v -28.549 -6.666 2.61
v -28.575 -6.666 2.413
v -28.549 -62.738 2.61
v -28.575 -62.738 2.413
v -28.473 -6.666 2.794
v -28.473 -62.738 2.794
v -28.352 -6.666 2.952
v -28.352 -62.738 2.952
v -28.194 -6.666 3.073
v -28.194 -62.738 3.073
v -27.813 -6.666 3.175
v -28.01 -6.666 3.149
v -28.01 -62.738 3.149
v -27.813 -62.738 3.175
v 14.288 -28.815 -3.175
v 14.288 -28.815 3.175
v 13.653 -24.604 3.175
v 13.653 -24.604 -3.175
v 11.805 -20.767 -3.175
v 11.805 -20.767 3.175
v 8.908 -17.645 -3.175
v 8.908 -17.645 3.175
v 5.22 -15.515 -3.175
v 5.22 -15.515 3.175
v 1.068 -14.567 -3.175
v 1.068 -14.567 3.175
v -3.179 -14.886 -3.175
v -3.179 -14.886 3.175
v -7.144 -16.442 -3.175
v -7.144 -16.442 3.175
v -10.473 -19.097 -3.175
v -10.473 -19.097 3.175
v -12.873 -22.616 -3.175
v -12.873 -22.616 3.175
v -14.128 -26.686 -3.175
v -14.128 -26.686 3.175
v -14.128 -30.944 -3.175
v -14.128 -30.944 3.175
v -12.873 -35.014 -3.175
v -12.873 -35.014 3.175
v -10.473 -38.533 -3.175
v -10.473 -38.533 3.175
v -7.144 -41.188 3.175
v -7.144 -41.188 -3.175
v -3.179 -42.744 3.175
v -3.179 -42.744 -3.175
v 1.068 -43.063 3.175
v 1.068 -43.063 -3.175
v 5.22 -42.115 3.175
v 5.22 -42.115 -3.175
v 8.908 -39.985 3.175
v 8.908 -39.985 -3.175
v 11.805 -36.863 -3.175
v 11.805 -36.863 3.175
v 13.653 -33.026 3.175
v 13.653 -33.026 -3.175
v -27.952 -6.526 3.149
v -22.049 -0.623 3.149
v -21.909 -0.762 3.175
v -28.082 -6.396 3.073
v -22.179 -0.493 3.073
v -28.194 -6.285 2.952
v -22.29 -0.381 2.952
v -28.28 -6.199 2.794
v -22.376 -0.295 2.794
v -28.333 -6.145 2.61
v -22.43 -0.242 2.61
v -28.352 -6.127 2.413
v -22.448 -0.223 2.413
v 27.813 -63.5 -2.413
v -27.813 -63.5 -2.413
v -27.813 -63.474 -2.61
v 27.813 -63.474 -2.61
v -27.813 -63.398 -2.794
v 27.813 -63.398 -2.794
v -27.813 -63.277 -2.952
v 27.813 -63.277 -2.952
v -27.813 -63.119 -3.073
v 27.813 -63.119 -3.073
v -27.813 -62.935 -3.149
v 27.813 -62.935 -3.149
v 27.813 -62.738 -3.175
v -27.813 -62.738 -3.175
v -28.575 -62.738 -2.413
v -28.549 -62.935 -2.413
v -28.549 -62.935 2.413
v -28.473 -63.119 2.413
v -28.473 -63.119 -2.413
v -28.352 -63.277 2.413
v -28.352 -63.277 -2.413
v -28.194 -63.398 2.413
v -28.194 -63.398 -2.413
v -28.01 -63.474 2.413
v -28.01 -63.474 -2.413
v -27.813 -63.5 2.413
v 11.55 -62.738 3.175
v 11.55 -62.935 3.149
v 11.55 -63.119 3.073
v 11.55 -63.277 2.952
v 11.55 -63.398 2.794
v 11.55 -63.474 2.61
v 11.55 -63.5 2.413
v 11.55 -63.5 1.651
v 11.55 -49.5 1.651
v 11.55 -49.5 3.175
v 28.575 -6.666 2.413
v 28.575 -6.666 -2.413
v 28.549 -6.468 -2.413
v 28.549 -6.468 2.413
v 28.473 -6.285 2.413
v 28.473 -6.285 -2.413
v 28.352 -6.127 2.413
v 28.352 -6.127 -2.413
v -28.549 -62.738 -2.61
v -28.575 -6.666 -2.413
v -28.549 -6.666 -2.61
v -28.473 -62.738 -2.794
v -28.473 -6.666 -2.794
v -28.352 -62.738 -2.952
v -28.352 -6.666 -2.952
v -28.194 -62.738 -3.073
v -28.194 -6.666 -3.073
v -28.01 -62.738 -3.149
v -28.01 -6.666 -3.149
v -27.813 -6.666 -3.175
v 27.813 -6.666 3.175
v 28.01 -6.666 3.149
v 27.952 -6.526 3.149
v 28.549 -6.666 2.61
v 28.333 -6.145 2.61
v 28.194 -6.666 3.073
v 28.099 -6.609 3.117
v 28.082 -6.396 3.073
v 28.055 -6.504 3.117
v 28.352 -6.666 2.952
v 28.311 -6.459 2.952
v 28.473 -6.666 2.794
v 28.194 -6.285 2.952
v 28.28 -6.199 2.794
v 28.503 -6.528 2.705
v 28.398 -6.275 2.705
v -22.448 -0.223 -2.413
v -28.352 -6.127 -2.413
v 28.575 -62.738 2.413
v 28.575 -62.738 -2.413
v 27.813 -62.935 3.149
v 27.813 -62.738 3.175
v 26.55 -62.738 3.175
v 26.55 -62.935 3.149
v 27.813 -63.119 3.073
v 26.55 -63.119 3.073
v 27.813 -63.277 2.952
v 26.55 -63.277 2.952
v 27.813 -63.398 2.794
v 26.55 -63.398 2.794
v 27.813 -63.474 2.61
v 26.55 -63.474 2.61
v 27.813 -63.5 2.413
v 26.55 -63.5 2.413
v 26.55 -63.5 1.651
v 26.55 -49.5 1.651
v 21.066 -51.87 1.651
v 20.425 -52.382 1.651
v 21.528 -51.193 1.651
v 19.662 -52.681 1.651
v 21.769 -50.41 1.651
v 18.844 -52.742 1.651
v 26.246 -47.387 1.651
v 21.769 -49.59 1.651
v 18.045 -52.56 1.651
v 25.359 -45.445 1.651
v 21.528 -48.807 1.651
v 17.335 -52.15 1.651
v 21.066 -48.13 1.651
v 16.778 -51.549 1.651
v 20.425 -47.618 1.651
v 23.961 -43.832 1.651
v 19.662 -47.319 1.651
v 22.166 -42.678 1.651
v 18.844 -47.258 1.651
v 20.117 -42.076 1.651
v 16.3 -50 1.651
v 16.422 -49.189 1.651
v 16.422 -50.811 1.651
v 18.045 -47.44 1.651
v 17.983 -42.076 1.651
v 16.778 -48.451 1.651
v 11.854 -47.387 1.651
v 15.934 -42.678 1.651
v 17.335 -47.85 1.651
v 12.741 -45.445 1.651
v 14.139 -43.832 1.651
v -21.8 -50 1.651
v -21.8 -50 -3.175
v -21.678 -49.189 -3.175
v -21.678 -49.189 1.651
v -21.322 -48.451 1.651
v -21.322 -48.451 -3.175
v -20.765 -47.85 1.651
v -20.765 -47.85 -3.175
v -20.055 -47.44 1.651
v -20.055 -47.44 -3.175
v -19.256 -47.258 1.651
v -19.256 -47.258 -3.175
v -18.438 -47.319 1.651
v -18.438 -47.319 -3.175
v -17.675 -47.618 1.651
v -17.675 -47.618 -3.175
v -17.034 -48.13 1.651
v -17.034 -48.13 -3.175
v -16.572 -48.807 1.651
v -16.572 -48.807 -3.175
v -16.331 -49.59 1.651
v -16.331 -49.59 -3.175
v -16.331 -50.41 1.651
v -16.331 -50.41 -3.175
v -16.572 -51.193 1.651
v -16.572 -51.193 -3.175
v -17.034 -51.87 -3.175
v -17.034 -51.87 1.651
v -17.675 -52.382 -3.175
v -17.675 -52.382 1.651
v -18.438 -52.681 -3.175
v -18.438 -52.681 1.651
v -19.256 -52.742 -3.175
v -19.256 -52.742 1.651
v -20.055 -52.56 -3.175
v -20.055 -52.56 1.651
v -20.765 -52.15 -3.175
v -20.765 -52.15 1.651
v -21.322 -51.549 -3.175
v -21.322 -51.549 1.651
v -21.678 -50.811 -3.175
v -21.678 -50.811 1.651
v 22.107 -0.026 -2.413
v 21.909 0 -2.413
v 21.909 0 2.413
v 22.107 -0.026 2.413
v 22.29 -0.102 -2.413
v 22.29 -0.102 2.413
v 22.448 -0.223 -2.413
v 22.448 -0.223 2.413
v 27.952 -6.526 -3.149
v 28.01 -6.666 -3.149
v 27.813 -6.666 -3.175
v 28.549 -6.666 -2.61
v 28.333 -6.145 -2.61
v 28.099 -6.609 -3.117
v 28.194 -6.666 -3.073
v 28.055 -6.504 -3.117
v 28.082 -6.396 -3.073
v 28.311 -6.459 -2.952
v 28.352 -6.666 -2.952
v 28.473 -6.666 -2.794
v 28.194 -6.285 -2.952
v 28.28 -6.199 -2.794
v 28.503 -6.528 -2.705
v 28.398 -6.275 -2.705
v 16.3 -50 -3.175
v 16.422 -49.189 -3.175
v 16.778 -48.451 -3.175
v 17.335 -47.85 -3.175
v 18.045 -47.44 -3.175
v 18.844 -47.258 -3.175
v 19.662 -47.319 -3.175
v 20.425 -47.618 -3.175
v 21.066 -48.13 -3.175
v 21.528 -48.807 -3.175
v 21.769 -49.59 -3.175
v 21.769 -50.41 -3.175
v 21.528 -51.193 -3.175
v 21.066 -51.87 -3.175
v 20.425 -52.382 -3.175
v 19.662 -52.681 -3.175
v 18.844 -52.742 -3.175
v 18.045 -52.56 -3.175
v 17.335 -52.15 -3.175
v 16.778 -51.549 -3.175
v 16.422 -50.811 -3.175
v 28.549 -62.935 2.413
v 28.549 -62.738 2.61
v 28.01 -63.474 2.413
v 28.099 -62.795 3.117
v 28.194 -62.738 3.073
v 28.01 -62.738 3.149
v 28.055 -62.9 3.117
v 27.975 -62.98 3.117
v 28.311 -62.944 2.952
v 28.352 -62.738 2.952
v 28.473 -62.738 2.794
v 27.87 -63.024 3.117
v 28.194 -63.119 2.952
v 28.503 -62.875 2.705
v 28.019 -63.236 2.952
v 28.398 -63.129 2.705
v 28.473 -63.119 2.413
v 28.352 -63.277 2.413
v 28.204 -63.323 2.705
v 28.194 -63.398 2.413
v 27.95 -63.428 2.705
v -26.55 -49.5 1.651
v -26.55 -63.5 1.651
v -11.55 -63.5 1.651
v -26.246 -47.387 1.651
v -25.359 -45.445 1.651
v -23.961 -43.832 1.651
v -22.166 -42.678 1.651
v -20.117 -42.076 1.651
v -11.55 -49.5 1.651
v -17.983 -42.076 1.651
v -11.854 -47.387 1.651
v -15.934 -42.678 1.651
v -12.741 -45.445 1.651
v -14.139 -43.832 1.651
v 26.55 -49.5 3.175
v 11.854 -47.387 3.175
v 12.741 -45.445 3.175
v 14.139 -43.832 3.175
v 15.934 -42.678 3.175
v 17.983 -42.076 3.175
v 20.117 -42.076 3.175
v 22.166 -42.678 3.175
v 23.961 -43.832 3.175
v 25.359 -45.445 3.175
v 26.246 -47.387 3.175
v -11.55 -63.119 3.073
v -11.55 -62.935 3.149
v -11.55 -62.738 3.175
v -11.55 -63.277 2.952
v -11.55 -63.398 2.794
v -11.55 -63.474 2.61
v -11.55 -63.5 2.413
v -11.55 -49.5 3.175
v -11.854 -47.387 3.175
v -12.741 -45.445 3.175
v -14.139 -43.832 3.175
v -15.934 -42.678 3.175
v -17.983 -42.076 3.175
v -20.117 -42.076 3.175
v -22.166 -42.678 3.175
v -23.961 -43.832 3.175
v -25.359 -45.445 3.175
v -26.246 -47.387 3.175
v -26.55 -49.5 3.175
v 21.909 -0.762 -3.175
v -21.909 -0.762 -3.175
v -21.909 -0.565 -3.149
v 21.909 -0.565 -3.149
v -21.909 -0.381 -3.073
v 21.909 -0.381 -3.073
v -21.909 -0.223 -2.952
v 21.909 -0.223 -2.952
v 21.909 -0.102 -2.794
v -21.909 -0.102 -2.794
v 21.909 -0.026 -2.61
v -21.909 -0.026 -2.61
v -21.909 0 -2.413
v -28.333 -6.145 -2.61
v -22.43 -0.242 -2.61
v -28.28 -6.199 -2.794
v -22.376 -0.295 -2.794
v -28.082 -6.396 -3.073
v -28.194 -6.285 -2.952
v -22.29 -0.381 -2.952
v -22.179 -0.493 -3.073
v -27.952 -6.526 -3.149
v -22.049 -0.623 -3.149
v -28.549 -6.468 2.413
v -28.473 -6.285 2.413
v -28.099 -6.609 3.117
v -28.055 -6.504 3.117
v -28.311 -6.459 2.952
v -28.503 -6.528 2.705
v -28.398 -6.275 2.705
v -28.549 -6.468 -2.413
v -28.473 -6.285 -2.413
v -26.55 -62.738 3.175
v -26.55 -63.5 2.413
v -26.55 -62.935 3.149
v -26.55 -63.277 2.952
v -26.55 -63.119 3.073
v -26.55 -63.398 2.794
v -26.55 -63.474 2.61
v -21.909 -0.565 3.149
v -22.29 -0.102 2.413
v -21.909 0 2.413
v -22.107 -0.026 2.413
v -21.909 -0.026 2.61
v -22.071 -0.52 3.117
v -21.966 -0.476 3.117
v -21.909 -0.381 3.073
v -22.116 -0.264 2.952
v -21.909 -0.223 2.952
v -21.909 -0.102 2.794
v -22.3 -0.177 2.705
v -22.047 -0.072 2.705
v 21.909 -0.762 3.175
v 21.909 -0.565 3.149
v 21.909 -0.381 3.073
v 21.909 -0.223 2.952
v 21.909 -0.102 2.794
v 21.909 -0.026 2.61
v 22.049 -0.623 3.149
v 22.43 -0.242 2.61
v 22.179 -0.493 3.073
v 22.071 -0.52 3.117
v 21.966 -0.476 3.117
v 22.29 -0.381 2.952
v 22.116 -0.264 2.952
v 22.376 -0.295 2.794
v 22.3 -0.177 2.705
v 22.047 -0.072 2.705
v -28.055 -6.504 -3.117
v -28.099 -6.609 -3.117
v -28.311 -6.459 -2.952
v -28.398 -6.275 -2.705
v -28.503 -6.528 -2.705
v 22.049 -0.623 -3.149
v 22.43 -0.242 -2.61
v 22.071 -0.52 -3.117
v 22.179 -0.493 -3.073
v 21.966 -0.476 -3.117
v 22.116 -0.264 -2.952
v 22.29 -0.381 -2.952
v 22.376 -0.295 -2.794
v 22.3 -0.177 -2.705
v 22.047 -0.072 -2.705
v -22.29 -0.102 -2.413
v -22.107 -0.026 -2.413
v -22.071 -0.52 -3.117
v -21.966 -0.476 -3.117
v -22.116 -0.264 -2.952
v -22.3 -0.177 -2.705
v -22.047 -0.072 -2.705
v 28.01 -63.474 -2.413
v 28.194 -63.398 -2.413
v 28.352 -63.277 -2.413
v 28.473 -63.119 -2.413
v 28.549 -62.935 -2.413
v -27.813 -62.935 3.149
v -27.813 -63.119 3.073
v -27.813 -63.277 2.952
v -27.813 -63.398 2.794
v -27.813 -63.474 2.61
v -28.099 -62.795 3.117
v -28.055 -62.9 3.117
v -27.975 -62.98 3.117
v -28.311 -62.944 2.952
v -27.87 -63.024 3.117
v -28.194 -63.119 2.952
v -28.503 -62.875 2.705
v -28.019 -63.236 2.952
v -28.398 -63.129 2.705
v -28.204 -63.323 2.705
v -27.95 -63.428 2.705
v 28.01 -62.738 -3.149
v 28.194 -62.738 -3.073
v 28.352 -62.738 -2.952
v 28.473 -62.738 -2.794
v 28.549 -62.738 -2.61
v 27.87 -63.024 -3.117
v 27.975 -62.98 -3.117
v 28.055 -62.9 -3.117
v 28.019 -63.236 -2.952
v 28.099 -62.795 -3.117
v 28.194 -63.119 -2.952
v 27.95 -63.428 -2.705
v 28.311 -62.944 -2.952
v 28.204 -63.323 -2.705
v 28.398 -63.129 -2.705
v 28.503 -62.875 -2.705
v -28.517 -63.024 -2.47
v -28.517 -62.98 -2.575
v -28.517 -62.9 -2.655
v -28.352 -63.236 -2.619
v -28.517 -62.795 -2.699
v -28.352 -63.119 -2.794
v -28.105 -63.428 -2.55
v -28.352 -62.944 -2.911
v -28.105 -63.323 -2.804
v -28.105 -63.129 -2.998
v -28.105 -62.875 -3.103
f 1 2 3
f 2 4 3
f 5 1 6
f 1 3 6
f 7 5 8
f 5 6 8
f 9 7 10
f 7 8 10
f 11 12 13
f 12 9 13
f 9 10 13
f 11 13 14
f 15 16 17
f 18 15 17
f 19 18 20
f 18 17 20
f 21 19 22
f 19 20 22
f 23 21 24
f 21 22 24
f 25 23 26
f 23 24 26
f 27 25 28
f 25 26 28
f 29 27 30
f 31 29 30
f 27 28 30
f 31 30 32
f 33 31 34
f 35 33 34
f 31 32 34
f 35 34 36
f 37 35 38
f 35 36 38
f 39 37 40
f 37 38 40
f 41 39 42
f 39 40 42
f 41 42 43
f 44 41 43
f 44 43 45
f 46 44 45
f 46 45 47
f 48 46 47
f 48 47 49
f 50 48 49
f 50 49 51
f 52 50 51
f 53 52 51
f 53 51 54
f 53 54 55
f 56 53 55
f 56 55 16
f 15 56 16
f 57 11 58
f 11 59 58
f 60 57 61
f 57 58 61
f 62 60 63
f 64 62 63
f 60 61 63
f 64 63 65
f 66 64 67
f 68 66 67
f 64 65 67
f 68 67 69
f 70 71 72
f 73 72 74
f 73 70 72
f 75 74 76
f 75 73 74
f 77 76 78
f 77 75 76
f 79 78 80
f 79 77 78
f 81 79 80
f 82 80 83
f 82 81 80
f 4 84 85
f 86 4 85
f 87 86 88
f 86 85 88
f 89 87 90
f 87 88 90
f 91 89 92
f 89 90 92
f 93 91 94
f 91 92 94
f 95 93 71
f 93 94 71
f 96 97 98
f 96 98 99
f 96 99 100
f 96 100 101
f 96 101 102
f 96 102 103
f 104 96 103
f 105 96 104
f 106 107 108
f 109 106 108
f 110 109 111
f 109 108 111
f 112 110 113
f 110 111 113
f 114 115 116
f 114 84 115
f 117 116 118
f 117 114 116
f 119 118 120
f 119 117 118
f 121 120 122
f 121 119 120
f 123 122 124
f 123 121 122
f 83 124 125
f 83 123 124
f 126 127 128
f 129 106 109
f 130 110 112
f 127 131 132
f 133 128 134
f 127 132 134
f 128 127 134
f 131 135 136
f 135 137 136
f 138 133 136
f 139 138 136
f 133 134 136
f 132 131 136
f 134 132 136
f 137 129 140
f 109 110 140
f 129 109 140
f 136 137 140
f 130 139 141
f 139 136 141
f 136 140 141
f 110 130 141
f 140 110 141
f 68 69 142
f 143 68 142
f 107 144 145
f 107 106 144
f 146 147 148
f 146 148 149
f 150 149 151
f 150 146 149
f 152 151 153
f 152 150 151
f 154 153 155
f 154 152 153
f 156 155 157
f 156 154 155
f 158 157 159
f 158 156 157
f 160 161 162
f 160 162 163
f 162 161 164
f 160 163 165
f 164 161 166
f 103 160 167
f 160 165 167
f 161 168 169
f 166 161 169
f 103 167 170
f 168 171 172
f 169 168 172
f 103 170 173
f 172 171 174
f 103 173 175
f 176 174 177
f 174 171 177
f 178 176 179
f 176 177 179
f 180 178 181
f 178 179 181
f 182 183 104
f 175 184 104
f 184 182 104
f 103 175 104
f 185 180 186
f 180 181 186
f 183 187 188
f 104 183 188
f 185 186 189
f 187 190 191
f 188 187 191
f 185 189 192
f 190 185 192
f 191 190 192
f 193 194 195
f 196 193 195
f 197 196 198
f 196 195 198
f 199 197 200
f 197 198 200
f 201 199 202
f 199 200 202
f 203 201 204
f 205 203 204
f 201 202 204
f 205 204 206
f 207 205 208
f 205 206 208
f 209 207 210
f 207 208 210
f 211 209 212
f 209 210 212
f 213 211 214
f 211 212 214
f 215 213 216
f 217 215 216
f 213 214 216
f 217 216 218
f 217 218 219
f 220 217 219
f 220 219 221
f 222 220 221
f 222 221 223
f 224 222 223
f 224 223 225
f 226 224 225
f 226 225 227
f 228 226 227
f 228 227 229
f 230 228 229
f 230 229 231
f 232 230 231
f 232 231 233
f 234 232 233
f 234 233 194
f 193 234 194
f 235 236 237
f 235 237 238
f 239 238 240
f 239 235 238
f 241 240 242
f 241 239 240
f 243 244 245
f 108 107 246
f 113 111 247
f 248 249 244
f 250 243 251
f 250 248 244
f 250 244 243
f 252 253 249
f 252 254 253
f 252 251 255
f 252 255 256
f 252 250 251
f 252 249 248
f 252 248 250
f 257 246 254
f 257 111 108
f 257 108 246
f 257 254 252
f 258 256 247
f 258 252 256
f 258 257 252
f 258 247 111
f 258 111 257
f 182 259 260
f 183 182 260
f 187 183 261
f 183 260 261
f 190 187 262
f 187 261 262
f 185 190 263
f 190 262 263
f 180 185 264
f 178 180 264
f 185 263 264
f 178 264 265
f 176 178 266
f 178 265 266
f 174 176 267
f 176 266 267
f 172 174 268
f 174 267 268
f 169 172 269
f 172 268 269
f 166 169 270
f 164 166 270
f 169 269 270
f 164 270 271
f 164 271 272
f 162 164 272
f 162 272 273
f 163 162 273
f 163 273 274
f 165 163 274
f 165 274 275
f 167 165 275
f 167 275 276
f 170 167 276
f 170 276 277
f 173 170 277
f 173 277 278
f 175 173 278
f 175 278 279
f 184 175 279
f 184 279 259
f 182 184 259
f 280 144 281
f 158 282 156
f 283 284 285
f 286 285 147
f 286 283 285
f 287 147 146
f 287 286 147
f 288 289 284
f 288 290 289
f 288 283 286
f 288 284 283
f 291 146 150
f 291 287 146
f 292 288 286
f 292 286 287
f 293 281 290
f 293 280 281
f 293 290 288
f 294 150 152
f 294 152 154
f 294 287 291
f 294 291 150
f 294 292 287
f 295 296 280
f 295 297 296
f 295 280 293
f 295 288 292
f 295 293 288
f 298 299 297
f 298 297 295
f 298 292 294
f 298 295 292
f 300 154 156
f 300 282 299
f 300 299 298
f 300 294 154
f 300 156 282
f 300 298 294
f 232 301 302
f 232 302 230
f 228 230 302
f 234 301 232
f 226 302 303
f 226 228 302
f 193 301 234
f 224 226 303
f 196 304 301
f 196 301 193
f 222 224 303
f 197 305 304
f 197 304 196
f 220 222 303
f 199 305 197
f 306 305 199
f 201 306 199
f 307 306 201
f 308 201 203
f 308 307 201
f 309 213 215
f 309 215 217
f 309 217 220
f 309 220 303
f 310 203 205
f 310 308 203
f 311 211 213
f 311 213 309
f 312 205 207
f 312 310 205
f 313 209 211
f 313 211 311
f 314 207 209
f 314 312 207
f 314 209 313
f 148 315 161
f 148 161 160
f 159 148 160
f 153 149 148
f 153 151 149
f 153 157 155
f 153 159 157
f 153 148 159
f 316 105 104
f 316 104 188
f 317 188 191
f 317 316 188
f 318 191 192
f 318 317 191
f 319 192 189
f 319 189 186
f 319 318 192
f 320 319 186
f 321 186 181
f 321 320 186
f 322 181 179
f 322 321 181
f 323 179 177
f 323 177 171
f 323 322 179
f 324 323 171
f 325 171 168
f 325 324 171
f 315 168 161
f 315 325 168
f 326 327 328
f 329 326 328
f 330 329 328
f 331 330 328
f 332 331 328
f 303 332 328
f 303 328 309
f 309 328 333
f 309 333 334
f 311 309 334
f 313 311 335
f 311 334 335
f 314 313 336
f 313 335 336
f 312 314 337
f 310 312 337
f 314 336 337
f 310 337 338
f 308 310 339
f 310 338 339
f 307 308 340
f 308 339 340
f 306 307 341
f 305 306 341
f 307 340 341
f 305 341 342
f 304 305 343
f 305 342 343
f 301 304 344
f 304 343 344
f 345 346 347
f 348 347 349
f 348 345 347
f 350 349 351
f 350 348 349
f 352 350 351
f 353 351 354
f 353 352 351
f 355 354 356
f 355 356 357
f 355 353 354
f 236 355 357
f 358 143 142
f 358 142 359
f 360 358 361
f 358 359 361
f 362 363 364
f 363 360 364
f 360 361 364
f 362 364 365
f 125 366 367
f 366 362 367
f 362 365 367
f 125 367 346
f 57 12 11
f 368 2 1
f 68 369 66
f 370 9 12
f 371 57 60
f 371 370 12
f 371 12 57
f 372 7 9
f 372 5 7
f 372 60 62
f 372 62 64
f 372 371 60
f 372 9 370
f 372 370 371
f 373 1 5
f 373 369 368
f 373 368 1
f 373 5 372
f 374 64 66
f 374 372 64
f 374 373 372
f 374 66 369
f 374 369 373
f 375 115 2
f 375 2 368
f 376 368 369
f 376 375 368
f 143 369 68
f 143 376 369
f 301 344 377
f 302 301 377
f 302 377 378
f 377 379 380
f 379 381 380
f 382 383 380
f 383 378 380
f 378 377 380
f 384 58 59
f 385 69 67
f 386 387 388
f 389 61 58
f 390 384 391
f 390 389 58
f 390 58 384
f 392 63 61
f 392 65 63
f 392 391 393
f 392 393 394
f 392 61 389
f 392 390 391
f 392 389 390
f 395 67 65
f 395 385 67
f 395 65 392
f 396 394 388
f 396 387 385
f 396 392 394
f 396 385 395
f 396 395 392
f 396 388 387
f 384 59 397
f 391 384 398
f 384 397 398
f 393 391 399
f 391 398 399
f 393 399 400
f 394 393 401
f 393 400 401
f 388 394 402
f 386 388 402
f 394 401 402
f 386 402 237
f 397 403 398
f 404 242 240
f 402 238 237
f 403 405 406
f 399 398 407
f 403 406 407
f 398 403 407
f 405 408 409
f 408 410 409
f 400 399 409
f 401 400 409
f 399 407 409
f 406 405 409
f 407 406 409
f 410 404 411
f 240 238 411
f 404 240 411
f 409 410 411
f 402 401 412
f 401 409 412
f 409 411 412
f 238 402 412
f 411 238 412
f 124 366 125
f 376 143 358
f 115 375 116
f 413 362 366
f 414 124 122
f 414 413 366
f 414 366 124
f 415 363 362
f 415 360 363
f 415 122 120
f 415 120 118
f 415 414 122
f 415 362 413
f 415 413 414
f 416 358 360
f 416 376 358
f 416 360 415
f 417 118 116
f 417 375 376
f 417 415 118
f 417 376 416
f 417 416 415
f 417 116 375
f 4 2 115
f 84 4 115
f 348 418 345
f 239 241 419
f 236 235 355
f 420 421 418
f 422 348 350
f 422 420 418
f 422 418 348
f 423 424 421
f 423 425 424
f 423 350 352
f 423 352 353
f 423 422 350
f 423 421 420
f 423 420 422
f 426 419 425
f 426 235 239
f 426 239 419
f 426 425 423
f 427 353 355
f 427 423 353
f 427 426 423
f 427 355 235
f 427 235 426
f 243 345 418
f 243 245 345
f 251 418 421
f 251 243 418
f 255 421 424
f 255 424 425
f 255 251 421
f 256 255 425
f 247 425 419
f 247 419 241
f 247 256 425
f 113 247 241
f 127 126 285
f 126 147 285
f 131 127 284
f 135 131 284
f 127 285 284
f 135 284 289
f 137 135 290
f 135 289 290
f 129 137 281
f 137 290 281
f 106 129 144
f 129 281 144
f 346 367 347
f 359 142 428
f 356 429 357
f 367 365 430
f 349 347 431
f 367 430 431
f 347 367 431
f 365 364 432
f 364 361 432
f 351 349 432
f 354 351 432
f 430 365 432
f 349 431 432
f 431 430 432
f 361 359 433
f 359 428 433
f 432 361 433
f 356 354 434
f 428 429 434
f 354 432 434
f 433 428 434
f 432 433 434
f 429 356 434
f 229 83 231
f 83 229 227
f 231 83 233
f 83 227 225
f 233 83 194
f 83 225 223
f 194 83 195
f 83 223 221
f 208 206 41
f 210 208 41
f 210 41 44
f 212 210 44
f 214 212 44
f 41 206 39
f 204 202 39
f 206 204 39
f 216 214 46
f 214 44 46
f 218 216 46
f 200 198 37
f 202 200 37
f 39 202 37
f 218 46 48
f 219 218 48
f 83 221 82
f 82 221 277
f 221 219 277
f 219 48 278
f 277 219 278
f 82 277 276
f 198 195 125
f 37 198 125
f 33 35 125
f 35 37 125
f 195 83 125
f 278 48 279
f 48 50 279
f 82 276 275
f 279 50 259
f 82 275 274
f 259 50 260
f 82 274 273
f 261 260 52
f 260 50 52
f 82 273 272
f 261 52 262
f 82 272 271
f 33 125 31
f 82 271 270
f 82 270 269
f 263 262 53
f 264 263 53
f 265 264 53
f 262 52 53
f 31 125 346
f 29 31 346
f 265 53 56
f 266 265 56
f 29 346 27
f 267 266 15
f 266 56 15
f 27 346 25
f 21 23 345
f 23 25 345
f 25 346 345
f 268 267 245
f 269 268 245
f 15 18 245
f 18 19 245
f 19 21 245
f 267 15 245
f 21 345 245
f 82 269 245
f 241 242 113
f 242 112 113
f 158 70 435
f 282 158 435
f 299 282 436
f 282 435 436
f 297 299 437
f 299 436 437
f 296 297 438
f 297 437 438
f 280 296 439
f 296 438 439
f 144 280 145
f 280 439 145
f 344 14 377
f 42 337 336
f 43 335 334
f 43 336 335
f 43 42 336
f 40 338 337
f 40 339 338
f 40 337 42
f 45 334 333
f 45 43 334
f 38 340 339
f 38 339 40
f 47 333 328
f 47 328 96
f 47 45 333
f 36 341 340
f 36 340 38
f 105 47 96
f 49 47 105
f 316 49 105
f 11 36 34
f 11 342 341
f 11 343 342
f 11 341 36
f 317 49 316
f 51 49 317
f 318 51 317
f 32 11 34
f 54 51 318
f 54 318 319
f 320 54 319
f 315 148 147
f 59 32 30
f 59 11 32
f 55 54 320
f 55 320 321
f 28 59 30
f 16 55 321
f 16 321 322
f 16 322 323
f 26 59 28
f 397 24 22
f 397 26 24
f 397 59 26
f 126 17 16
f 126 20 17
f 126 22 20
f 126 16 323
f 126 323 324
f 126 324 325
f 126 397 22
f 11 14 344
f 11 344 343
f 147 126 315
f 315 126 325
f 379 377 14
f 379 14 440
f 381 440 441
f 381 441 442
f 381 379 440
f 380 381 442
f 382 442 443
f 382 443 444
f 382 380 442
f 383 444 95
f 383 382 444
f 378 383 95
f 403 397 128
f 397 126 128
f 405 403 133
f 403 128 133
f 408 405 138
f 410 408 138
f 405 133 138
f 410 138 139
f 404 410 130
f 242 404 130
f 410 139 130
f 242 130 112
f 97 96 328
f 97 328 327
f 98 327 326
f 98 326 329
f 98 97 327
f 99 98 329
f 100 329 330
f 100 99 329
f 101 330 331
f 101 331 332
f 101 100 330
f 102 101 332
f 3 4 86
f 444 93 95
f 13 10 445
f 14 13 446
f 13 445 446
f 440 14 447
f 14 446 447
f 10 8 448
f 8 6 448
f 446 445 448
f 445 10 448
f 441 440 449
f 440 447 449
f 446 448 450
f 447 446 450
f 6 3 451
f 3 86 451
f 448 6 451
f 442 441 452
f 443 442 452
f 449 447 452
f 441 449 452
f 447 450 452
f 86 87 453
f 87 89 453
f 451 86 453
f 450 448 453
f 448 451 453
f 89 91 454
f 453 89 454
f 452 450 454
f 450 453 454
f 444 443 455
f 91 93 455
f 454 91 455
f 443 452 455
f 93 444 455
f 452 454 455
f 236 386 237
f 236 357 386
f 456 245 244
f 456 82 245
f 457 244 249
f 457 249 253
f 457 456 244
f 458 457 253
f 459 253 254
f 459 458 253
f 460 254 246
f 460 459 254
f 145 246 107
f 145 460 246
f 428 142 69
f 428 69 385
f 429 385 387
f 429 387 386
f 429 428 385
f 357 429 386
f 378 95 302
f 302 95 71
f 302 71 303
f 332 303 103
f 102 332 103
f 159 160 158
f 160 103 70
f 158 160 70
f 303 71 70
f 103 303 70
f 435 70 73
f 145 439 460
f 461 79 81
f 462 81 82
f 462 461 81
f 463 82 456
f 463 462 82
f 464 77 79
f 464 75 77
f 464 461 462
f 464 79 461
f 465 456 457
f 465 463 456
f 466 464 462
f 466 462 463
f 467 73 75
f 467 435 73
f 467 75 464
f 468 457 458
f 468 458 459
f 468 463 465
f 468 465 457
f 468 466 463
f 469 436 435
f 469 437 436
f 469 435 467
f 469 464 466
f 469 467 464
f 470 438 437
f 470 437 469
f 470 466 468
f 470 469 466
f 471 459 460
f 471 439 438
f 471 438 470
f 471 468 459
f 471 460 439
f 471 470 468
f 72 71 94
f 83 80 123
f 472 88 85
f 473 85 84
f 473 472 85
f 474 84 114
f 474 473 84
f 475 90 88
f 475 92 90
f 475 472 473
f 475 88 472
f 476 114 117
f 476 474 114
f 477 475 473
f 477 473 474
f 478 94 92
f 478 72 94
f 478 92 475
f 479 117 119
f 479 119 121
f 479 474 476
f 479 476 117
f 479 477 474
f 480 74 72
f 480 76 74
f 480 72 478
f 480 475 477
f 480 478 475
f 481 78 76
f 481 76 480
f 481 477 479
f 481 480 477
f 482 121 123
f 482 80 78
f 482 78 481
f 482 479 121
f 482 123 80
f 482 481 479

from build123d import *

# Parameters (mm, degrees)
SKETCH2_W            = 57.15
SKETCH2_H            = 6.35
BOSS_EXTRUDE1_DEPTH  = 63.5
SKETCH3_R            = 14.2875
CUT_EXTRUDE1_DEPTH   = 70.922121857
CHAMFER1_SIZE        = 6.35
M5_CLEARANCE_HOLE1_D = 5.5
FILLET1_R            = 0.762
CUT_EXTRUDE4_DEPTH   = 1.524


with BuildPart() as part:
    # Sketch2 → Boss-Extrude1 (new body)
    with BuildSketch(Plane(origin=(0, 0, 0), x_dir=(1, 0, 0), z_dir=(0, 1, 0))):
        Rectangle(SKETCH2_W, SKETCH2_H)
    extrude(amount=-BOSS_EXTRUDE1_DEPTH)

    # Sketch3 → Cut-Extrude1 (cut, through all)
    with BuildSketch(Plane.XY.offset(3.175)):
        with Locations((0, -28.8150046)):
            Circle(SKETCH3_R)
    extrude(amount=-CUT_EXTRUDE1_DEPTH, mode=Mode.SUBTRACT)

    # Chamfer1
    chamfer1_edges = [part.edges().sort_by_distance(p)[0] for p in [
        (28.575, 0, 0),
        (-28.575, 0, 0),
    ]]
    chamfer(chamfer1_edges, length=CHAMFER1_SIZE)

    # M5 Clearance Hole1 (through all)
    with Locations(Plane.XY.offset(3.175)):
        with Locations((-19.05, -50.000003124), (19.05, -50.000003124)):
            Hole(M5_CLEARANCE_HOLE1_D / 2)

    # Fillet1
    fillet1_edges = [part.edges().sort_by_distance(p)[0] for p in [
        (28.575, -63.5, 0),
        (0, -63.5, -3.175),
        (0, 0, 3.175),
        (0, 0, -3.175),
        (22.225, 0, 0),
        (-22.225, 0, 0),
        (25.4, -3.175, 3.175),
        (-25.4, -3.175, 3.175),
        (-28.575, -6.35, 0),
        (25.4, -3.175, -3.175),
        (-25.4, -3.175, -3.175),
        (28.575, -6.35, 0),
        (-28.575, -63.5, 0),
        (-28.575, -34.925, -3.175),
        (28.575, -34.925, -3.175),
        (28.575, -34.925, 3.175),
        (-28.575, -34.925, 3.175),
        (0, -63.5, 3.175),
    ]]
    fillet(fillet1_edges, radius=FILLET1_R)

    # Sketch8 → Cut-Extrude4 (cut)
    with BuildSketch(Plane.XY.offset(3.175)):
        with BuildLine():
            Line((11.55, -63.5), (11.55, -49.5))
            ThreePointArc((11.55, -49.5), (19.05, -42), (26.55, -49.5))
            Line((26.55, -49.5), (26.55, -63.5))
            Line((26.55, -63.5), (11.55, -63.5))
        make_face()
    cut_extrude4 = extrude(amount=-CUT_EXTRUDE4_DEPTH, mode=Mode.SUBTRACT)

    # Mirror1: Cut-Extrude4 across plane
    add(cut_extrude4.mirror(Plane(origin=(0, 0, 0), x_dir=(0, 0, 1), z_dir=(1, 0, 0))), mode=Mode.SUBTRACT)


solid = part.part
